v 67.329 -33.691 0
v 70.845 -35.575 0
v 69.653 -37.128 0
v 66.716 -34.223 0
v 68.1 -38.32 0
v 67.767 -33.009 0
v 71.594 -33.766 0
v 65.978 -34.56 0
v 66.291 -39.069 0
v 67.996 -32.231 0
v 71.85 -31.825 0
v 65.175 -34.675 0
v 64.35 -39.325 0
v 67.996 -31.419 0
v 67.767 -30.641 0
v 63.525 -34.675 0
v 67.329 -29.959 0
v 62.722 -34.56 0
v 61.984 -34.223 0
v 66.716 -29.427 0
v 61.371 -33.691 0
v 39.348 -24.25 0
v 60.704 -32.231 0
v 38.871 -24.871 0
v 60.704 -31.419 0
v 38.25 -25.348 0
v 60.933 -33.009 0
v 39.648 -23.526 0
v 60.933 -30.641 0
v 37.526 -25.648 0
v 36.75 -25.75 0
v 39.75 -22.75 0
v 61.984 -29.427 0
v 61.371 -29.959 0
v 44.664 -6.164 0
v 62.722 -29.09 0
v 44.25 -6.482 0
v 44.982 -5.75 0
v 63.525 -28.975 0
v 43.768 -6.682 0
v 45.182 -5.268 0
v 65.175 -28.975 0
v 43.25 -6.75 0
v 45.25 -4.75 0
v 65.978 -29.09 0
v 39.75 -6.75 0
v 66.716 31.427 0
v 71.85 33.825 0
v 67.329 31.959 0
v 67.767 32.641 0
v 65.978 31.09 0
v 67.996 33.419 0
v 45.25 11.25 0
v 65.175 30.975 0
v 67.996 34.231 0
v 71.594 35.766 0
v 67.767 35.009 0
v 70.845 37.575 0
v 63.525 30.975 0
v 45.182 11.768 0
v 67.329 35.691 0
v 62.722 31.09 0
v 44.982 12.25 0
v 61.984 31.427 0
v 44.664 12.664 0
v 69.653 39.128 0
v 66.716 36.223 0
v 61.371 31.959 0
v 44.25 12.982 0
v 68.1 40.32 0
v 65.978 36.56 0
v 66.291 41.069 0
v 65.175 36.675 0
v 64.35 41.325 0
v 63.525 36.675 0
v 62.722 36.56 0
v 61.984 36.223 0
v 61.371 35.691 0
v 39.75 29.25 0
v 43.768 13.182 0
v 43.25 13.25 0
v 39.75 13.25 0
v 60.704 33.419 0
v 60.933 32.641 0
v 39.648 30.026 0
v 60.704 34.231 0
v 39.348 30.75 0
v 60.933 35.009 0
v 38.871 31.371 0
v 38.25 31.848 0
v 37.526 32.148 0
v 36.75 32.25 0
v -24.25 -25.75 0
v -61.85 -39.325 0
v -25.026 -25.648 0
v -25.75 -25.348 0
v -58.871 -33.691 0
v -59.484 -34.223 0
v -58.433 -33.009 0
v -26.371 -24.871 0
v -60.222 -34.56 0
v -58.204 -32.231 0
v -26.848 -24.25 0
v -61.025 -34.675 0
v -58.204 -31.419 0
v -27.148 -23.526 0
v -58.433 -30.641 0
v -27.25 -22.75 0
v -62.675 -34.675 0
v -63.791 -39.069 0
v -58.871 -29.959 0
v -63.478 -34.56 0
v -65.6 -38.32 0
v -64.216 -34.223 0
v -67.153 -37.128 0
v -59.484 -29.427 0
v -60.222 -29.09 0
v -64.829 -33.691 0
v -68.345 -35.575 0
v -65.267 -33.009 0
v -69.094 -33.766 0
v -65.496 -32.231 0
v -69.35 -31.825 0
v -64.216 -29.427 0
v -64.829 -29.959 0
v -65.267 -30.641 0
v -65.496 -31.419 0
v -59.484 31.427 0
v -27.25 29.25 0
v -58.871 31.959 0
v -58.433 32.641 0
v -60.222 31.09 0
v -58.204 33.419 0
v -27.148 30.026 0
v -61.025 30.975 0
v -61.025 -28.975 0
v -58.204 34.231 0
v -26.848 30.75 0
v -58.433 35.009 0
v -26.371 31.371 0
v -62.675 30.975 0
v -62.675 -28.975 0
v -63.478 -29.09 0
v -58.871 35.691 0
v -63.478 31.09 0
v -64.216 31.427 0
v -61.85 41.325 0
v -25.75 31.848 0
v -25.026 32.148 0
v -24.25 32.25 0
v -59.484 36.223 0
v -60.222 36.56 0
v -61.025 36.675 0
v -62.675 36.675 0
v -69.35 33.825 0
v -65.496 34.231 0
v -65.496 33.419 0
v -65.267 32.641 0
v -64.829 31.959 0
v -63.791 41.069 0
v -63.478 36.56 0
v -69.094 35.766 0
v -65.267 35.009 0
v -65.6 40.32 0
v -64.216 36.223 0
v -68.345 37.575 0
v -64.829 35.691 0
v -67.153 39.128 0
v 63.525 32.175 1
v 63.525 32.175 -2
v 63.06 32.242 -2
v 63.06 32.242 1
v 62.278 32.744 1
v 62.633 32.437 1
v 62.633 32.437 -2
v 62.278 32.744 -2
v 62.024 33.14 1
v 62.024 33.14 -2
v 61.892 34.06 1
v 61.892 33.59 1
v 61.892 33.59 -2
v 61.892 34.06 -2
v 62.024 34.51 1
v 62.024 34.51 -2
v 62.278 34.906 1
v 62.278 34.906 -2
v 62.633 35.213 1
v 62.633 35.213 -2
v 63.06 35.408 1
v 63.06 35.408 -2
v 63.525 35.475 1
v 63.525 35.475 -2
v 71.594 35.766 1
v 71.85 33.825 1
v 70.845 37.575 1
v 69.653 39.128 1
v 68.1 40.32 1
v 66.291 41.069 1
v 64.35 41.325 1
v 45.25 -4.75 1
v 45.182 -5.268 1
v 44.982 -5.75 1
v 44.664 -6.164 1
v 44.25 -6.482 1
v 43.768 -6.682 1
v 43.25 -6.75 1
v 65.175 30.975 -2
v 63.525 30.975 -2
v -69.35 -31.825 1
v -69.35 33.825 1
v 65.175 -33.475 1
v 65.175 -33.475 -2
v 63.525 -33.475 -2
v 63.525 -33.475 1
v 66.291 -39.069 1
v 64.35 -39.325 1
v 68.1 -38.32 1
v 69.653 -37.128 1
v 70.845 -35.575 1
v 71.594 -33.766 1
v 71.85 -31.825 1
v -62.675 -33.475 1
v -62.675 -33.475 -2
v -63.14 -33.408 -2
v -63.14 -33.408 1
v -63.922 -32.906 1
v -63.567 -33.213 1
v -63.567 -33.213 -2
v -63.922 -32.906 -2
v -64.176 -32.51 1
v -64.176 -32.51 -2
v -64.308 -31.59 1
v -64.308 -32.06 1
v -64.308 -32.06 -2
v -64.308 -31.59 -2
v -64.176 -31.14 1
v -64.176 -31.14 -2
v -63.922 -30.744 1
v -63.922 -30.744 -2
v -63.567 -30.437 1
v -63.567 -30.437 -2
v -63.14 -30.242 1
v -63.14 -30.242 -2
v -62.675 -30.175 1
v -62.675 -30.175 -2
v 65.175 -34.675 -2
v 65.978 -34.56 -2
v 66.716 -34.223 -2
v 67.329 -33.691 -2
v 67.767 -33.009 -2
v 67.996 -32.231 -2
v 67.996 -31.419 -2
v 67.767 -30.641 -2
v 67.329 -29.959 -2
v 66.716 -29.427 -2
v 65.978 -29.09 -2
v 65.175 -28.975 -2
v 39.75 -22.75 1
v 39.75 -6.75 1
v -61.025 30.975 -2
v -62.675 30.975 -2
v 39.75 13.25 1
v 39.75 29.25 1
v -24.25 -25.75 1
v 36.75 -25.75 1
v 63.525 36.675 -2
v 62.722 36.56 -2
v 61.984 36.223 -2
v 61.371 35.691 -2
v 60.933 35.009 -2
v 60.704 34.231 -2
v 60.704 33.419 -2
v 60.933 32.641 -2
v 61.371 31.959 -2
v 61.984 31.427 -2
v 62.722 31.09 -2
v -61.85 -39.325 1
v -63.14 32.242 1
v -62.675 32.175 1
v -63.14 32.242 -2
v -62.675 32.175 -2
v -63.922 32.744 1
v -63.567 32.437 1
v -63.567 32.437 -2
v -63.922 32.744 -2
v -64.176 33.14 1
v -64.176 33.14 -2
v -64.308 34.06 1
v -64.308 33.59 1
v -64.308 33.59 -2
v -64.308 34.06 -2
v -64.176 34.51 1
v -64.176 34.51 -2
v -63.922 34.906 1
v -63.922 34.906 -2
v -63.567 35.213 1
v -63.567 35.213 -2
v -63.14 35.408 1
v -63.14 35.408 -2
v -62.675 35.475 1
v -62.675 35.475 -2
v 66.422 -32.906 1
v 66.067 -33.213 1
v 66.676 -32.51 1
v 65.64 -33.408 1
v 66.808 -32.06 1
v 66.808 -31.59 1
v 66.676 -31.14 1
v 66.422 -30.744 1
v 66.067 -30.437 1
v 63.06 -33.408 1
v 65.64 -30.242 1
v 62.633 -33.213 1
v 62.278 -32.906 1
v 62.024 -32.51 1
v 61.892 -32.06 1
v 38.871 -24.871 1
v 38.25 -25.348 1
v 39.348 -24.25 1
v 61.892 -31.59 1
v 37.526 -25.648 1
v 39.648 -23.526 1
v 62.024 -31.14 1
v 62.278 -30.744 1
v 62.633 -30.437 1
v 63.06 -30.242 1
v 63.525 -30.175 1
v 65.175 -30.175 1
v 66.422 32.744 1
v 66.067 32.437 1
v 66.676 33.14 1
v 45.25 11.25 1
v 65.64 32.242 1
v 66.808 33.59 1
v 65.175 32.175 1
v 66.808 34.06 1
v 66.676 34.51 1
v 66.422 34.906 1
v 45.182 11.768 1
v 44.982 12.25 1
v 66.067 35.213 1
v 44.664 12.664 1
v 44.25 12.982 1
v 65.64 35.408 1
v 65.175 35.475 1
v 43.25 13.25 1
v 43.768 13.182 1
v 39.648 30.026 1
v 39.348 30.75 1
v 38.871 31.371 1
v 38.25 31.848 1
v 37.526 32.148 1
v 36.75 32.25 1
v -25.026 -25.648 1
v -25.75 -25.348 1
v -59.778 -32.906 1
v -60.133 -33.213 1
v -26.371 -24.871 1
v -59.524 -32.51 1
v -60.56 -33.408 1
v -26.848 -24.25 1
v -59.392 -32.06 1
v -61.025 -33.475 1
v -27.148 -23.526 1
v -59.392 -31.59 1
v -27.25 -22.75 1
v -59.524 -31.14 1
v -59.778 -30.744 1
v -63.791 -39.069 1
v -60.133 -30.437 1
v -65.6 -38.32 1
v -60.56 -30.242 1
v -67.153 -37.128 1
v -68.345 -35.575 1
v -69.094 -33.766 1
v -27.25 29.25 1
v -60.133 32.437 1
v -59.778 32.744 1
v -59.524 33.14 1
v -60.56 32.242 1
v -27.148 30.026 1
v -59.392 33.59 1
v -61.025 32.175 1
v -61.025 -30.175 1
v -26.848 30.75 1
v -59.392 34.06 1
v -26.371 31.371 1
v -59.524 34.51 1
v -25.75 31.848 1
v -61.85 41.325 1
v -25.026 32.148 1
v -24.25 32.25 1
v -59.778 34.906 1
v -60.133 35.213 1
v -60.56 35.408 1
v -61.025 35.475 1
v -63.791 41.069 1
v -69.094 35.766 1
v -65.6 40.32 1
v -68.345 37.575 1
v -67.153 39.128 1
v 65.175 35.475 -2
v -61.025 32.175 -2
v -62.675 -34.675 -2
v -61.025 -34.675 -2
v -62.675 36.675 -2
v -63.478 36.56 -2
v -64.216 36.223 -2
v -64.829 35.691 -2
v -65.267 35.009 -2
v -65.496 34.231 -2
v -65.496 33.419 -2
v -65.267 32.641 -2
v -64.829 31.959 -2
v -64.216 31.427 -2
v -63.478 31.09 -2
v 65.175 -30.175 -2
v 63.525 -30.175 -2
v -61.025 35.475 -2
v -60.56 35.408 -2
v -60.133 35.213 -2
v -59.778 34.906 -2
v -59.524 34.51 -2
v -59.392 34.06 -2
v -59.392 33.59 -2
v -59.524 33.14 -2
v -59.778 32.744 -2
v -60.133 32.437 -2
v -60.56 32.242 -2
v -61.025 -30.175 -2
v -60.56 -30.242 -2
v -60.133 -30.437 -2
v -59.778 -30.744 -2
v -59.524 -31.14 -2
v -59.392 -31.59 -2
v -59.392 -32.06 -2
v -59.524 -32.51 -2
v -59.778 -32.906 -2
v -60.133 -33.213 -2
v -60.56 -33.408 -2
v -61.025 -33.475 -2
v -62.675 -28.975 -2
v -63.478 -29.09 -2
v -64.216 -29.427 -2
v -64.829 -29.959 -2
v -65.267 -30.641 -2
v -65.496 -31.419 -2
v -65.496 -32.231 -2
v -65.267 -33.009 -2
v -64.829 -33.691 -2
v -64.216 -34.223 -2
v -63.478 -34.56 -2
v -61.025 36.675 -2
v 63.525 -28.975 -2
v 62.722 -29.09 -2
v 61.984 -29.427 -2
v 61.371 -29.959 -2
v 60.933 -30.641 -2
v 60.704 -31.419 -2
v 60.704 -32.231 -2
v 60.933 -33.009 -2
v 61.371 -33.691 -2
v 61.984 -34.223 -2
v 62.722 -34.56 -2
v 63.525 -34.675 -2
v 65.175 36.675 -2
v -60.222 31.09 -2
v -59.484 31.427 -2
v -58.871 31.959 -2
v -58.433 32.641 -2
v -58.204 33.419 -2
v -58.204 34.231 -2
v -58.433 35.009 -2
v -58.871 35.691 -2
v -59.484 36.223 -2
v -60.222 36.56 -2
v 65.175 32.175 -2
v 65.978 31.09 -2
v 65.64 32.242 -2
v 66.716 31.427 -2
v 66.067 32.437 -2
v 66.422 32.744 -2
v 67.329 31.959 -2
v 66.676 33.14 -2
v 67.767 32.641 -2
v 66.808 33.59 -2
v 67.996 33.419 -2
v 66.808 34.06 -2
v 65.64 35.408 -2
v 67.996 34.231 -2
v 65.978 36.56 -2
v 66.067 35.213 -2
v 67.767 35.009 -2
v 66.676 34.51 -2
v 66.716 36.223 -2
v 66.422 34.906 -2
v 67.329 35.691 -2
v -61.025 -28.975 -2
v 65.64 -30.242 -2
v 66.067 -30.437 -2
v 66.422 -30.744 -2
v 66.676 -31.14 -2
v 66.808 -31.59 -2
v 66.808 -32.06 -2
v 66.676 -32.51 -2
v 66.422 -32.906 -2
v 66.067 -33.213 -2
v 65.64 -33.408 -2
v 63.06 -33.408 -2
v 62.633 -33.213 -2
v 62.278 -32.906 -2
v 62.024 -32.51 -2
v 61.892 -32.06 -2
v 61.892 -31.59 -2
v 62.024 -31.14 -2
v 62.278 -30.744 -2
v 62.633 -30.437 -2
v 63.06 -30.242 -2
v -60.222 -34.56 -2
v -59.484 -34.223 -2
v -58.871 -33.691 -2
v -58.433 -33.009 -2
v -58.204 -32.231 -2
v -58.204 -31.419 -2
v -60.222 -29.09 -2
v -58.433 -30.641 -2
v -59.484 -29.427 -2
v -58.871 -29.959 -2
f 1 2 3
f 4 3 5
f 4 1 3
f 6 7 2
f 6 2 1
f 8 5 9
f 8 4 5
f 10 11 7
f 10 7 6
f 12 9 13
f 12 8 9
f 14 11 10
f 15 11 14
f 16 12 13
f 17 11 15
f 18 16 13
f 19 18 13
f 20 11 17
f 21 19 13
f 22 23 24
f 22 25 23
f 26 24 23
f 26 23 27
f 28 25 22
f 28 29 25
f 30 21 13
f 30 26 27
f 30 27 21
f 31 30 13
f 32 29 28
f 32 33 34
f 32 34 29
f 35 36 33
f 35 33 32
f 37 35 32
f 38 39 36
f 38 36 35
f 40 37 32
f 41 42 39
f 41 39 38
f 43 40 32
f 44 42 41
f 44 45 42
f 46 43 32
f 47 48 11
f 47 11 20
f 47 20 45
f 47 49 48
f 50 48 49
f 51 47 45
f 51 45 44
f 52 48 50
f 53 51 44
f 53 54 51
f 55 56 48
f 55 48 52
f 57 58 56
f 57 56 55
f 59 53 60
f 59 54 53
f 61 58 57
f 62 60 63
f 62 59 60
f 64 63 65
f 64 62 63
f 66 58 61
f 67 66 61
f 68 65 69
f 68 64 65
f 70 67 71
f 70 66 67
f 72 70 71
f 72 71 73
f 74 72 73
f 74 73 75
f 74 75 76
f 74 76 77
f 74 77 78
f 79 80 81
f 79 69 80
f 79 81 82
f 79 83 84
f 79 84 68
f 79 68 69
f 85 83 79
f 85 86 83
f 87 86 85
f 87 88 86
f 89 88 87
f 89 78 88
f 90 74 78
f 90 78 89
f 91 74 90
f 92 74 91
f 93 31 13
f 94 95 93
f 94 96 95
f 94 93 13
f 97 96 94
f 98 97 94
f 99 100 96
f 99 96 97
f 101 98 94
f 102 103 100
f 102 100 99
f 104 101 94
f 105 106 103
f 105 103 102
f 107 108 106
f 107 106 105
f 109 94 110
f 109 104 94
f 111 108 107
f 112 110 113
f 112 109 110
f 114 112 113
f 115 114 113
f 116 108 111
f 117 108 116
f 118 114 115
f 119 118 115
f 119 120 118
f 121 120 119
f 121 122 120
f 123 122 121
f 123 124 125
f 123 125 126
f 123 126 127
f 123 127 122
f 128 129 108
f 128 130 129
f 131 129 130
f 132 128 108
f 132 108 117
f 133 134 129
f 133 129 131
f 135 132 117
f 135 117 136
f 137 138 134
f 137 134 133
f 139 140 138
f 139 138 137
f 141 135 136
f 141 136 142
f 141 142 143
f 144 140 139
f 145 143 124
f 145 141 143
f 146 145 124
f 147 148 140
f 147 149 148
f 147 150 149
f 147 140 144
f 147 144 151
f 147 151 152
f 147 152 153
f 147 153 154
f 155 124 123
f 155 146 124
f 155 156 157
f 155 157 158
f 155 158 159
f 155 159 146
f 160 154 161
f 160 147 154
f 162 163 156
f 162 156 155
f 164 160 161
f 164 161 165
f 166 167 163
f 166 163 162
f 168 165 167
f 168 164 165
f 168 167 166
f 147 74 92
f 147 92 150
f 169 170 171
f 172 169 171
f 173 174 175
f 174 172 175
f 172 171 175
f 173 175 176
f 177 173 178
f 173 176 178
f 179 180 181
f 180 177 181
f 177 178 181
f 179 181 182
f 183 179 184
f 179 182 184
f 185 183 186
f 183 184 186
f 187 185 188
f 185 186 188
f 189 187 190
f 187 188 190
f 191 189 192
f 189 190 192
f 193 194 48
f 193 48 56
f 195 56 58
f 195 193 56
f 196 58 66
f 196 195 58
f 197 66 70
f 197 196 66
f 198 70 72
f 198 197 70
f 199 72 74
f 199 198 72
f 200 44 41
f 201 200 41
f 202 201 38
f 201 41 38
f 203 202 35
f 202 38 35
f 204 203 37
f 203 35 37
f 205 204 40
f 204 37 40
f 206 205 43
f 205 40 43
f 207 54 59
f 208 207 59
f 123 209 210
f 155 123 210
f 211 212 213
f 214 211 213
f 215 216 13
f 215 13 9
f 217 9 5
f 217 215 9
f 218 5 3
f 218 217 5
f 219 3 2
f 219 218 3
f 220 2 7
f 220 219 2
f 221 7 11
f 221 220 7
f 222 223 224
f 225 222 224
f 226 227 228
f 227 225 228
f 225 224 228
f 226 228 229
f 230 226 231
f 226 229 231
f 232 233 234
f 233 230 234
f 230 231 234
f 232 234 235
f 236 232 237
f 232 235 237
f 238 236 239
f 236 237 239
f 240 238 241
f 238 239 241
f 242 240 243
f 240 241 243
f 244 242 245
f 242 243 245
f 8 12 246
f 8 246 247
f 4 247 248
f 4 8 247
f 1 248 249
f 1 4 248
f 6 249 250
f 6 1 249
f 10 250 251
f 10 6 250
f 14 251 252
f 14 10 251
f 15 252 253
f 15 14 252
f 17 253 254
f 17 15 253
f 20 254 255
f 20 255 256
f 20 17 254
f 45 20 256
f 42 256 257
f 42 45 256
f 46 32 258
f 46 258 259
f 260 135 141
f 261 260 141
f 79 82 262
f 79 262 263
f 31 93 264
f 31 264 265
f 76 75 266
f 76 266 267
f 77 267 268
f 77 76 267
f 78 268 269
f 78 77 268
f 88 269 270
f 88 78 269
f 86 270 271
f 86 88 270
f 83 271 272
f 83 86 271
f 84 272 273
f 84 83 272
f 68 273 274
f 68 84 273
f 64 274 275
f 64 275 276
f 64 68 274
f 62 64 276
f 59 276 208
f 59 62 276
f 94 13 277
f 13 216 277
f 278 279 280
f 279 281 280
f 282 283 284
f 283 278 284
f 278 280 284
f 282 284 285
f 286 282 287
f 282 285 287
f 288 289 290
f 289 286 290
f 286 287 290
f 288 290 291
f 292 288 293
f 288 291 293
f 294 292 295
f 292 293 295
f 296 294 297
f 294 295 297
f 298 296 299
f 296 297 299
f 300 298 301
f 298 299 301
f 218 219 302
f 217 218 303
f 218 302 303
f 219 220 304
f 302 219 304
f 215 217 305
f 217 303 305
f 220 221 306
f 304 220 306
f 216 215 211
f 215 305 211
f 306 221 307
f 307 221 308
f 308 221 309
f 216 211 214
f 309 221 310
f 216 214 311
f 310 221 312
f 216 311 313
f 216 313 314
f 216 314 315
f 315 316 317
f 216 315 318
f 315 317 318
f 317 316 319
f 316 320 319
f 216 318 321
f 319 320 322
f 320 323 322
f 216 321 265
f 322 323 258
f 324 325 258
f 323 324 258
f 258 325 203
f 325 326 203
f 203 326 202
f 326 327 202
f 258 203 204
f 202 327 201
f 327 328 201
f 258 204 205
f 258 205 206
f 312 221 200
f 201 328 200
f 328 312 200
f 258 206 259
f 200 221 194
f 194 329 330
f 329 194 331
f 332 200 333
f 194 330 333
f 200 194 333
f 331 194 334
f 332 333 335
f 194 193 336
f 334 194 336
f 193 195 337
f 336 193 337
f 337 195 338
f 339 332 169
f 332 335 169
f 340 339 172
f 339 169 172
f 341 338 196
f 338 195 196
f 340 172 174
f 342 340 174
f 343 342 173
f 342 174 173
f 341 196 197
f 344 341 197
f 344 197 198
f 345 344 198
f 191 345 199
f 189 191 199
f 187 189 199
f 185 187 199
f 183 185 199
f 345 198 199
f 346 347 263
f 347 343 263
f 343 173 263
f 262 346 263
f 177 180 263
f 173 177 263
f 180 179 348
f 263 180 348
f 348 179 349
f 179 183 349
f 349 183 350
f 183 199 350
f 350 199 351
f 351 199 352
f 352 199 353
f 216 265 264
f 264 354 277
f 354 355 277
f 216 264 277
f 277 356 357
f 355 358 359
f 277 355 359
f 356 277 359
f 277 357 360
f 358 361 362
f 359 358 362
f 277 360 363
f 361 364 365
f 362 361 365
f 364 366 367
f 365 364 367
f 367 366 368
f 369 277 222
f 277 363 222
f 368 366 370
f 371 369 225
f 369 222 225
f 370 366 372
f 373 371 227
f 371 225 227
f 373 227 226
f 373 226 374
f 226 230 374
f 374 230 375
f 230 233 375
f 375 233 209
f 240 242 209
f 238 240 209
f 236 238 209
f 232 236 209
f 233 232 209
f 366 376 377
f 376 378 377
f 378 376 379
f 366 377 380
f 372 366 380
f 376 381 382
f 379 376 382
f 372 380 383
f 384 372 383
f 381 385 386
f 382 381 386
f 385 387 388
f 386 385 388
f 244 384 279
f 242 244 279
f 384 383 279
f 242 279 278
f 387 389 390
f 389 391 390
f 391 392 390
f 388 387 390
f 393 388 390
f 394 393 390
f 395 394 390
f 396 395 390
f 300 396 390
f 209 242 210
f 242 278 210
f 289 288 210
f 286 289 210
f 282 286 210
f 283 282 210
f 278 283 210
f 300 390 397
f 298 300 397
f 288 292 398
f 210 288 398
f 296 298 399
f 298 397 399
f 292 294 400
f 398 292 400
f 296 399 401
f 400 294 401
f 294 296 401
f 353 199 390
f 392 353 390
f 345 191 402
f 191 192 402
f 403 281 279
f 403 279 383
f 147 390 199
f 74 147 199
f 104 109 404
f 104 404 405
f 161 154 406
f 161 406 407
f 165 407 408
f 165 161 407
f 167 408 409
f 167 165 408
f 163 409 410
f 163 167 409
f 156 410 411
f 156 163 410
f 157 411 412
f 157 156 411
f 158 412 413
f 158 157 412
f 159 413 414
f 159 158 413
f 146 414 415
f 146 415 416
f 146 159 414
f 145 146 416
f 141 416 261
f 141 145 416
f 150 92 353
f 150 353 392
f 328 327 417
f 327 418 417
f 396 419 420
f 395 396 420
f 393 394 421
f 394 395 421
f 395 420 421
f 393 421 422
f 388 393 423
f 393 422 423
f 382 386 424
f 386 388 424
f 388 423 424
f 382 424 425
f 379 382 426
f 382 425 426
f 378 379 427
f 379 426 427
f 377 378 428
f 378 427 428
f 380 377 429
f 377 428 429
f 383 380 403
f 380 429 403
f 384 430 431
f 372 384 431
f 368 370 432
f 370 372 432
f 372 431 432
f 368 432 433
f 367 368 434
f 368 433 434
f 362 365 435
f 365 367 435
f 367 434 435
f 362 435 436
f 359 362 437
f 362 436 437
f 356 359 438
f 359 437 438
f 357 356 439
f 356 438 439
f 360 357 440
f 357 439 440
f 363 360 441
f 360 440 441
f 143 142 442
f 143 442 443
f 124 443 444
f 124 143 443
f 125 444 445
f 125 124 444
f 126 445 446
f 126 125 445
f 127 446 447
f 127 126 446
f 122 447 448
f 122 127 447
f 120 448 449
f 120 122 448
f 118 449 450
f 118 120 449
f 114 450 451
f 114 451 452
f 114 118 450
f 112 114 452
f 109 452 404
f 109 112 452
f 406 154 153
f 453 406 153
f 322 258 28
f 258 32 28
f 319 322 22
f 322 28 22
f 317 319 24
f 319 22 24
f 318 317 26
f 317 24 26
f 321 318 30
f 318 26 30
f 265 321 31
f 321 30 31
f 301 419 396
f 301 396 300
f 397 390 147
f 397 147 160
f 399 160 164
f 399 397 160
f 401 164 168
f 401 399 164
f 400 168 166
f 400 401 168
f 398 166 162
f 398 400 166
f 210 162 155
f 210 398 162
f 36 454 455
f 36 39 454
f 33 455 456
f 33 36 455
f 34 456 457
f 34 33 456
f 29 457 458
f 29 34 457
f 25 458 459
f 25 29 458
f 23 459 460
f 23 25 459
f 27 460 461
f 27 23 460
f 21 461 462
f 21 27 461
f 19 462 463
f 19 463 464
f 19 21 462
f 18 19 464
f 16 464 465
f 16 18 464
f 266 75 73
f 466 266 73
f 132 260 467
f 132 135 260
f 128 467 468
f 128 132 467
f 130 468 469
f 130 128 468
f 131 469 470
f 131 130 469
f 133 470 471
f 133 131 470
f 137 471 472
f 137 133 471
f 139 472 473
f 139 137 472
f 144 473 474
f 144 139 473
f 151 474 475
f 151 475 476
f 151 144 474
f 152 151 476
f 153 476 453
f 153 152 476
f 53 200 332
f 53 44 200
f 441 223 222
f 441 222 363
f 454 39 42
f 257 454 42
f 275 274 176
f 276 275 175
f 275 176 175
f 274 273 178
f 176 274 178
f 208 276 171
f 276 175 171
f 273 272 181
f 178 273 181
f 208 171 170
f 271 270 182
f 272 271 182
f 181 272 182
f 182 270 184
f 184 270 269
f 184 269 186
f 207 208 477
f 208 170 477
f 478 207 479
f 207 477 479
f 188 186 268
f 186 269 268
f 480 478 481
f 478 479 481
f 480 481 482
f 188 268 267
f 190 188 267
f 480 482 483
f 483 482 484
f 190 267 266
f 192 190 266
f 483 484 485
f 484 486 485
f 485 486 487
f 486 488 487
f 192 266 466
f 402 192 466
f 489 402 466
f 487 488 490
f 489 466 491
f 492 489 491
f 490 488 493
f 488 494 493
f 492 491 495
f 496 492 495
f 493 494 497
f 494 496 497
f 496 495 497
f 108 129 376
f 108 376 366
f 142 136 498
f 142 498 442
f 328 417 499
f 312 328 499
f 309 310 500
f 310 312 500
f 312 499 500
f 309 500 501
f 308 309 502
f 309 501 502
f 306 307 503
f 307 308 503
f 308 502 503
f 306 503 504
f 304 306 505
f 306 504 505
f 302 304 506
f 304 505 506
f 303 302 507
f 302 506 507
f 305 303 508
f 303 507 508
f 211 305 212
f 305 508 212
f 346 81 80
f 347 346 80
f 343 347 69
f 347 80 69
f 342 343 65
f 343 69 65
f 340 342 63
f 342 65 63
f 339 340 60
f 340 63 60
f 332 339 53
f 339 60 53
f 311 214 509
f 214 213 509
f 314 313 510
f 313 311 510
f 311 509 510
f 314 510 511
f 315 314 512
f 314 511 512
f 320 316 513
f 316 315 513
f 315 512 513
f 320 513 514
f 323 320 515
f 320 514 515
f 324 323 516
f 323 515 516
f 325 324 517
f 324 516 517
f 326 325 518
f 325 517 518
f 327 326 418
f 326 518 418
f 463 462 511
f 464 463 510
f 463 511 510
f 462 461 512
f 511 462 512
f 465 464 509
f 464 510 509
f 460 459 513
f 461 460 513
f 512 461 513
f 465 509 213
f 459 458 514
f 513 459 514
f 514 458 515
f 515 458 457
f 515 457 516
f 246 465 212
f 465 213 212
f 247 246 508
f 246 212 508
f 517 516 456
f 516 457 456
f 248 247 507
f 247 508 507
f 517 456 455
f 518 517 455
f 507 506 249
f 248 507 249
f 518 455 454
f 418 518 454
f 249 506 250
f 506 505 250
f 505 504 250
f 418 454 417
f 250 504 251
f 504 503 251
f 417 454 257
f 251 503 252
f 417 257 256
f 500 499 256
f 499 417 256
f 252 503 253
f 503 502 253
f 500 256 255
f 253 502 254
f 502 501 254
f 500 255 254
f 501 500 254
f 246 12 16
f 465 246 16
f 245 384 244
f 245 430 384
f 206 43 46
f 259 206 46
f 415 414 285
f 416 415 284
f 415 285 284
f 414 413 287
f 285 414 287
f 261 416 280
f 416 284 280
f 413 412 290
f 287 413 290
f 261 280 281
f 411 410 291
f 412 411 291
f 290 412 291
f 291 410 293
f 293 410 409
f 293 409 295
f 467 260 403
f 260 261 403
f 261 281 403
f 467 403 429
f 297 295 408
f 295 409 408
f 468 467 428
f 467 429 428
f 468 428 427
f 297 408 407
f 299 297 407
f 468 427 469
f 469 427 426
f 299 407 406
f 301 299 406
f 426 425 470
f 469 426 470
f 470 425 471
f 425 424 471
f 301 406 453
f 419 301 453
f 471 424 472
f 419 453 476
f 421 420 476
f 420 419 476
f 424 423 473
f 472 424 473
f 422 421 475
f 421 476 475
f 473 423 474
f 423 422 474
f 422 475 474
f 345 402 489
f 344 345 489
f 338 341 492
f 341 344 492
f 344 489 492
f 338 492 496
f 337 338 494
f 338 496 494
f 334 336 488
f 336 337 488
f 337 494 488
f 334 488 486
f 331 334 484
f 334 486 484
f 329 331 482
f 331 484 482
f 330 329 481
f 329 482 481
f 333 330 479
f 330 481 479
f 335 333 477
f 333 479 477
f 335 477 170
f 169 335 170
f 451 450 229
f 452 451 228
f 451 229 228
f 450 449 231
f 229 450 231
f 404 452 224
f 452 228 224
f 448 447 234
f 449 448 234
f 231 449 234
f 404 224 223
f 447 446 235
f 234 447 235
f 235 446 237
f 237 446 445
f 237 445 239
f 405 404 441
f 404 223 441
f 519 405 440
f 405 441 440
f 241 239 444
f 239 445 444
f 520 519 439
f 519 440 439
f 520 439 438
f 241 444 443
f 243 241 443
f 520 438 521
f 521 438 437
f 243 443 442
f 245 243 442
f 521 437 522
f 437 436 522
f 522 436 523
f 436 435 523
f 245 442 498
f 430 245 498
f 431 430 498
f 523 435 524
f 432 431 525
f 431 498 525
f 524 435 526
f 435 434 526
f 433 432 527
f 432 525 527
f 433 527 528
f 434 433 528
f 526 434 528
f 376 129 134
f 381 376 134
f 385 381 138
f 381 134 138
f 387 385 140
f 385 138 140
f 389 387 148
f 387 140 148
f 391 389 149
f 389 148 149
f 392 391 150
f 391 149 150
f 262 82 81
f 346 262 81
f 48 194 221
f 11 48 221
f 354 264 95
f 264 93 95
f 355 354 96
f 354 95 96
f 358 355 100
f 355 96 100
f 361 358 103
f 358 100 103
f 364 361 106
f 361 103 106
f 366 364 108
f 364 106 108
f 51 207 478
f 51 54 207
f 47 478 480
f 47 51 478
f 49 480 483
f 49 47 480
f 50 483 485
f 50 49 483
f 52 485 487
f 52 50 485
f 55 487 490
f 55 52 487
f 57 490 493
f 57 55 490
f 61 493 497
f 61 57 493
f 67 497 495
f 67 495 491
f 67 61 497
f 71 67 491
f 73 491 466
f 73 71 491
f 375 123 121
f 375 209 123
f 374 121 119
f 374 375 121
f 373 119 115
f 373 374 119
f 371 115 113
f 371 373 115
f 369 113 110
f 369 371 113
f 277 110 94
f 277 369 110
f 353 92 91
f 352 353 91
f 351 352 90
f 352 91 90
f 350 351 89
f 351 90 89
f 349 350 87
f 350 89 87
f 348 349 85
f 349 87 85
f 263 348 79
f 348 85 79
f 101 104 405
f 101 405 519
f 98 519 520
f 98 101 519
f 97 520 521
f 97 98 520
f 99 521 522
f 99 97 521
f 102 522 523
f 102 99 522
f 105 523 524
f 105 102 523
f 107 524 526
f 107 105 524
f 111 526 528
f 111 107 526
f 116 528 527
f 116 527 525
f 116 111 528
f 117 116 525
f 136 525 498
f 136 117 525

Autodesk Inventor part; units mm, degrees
ref_plane "YZ Plane" through (0, 0, 0) normal (1, 0, 0) x (0, 1, 0)
ref_plane "XZ Plane" through (0, 0, 0) normal (0, 1, 0) x (-1, 0, 0)
ref_plane "XY Plane" through (0, 0, 0) normal (0, 0, 1) x (1, 0, 0)
sketch "Sketch1" plane through (0, 0, 0) normal (0, 0, 1) x (1, 0, 0)
  line L0 (-88.6, 55.18) -> (88.6, 55.18)
  line L1 (96.28, 47.5) -> (96.28, -47.5)
  line L2 (88.6, -55.18) -> (-88.6, -55.18)
  line L3 (-96.28, -47.5) -> (-96.28, 47.5)
  arc A0 (-96.28, -47.5) -> (-88.6, -55.18) centre (-88.6, -47.5) ccw
  arc A1 (88.6, -55.18) -> (96.28, -47.5) centre (88.6, -47.5) ccw
  arc A2 (96.28, 47.5) -> (88.6, 55.18) centre (88.6, 47.5) ccw
  arc A3 (-88.6, 55.18) -> (-96.28, 47.5) centre (-88.6, 47.5) ccw
  line L4 (85, 52.5) -> (-85, 52.5)
  line L5 (-85, 52.5) -> (-85, -52.5)
  line L6 (-85, -52.5) -> (85, -52.5)
  line L7 (85, -52.5) -> (85, 52.5)
  line L8 (85, 52.5) -> (-85, -52.5) construction
  line L9 (-85, 52.5) -> (85, -52.5) construction
  line L10 (0, -55.18) -> (0, 55.18) construction
  line L11 (-96.28, 0) -> (96.28, 0) construction
  line L12 (88.6, -47.5) -> (-88.6, -47.5) construction
  line L13 (-88.6, -47.5) -> (-88.6, 47.5) construction
  line L14 (-88.6, 47.5) -> (88.6, 47.5) construction
  line L15 (88.6, 47.5) -> (88.6, -47.5) construction
  line L16 (-92.28, -50) -> (-92.28, 50)
  line L17 (-92.28, -50) -> (-85, -50)
  line L18 (-92.28, 50) -> (-85, 50)
  line L19 (64.35, -31.825) -> (64.35, 33.825) construction
  line L20 (64.35, 33.825) -> (-61.85, 33.825) construction
  line L21 (-61.85, 33.825) -> (-61.85, -31.825) construction
  line L22 (-61.85, -31.825) -> (64.35, -31.825) construction
  line L23 (-61.85, 33.825) -> (64.35, -31.825) construction
  line L24 (-61.85, -31.825) -> (64.35, 33.825) construction
  line L25 (1.25, 0) -> (1.25, 1) construction
  line L26 (1.25, 1) -> (0, 1) construction
  line L27 (63.525, -31.825) -> (65.175, -31.825) construction
  line L28 (63.525, -30.175) -> (65.175, -30.175)
  line L29 (65.175, -33.475) -> (63.525, -33.475)
  arc A4 (63.525, -30.175) -> (63.525, -33.475) centre (63.525, -31.825) ccw
  arc A5 (65.175, -33.475) -> (65.175, -30.175) centre (65.175, -31.825) ccw
  line L30 (63.525, 33.825) -> (65.175, 33.825) construction
  line L31 (63.525, 35.475) -> (65.175, 35.475)
  line L32 (65.175, 32.175) -> (63.525, 32.175)
  arc A6 (63.525, 35.475) -> (63.525, 32.175) centre (63.525, 33.825) ccw
  arc A7 (65.175, 32.175) -> (65.175, 35.475) centre (65.175, 33.825) ccw
  line L33 (-61.025, 33.825) -> (-62.675, 33.825) construction
  line L34 (-61.025, 35.475) -> (-62.675, 35.475)
  line L35 (-62.675, 32.175) -> (-61.025, 32.175)
  arc A8 (-61.025, 32.175) -> (-61.025, 35.475) centre (-61.025, 33.825) ccw
  arc A9 (-62.675, 35.475) -> (-62.675, 32.175) centre (-62.675, 33.825) ccw
  line L36 (-61.025, -31.825) -> (-62.675, -31.825) construction
  line L37 (-61.025, -30.175) -> (-62.675, -30.175)
  line L38 (-62.675, -33.475) -> (-61.025, -33.475)
  arc A10 (-61.025, -33.475) -> (-61.025, -30.175) centre (-61.025, -31.825) ccw
  arc A11 (-62.675, -30.175) -> (-62.675, -33.475) centre (-62.675, -31.825) ccw
  line L39 (98.28, -57.18) -> (-98.28, -57.18)
  line L40 (-98.28, -57.18) -> (-98.28, 57.18)
  line L41 (-98.28, 57.18) -> (98.28, 57.18)
  line L42 (98.28, 57.18) -> (98.28, -57.18)
  line L43 (98.28, -57.18) -> (-98.28, 57.18) construction
  line L44 (-98.28, -57.18) -> (98.28, 57.18) construction
  line L45 (-69.85, 27.075) -> (-53.85, 27.075)
  line L46 (-53.85, 27.075) -> (-53.85, 40.575)
  line L47 (-53.85, 40.575) -> (-69.85, 40.575)
  line L48 (-69.85, 40.575) -> (-69.85, 27.075)
  line L49 (-69.85, 27.075) -> (-53.85, 40.575) construction
  line L50 (-53.85, 27.075) -> (-69.85, 40.575) construction
  line L51 (-53.85, -38.575) -> (-69.85, -38.575)
  line L52 (-69.85, -38.575) -> (-69.85, -25.075)
  line L53 (-69.85, -25.075) -> (-53.85, -25.075)
  line L54 (-53.85, -25.075) -> (-53.85, -38.575)
  line L55 (-53.85, -38.575) -> (-69.85, -25.075) construction
  line L56 (-69.85, -38.575) -> (-53.85, -25.075) construction
  line L57 (56.35, -38.575) -> (72.35, -38.575)
  line L58 (72.35, -38.575) -> (72.35, -25.075)
  line L59 (72.35, -25.075) -> (56.35, -25.075)
  line L60 (56.35, -25.075) -> (56.35, -38.575)
  line L61 (56.35, -38.575) -> (72.35, -25.075) construction
  line L62 (72.35, -38.575) -> (56.35, -25.075) construction
  line L63 (72.35, 40.575) -> (56.35, 40.575)
  line L64 (56.35, 40.575) -> (56.35, 27.075)
  line L65 (56.35, 27.075) -> (72.35, 27.075)
  line L66 (72.35, 27.075) -> (72.35, 40.575)
  line L67 (72.35, 40.575) -> (56.35, 27.075) construction
  line L68 (56.35, 40.575) -> (72.35, 27.075) construction
  line L69 (-22.75, -21.25) -> (35.25, -21.25) construction
  line L70 (35.25, -21.25) -> (35.25, 27.75) construction
  line L71 (35.25, 27.75) -> (-22.75, 27.75) construction
  line L72 (-22.75, 27.75) -> (-22.75, -21.25) construction
  line L73 (-22.75, -21.25) -> (35.25, 27.75) construction
  line L74 (35.25, -21.25) -> (-22.75, 27.75) construction
  line L75 (-22.75, -31.25) -> (35.25, -31.25)
  line L76 (45.25, -21.25) -> (45.25, 27.75)
  line L77 (35.25, 37.75) -> (-22.75, 37.75)
  line L78 (-32.75, 27.75) -> (-32.75, -21.25)
  line L79 (-32.75, -31.25) -> (45.25, 37.75) construction
  line L80 (45.25, -31.25) -> (-32.75, 37.75) construction
  arc A12 (-22.75, 37.75) -> (-32.75, 27.75) centre (-22.75, 27.75) ccw
  arc A13 (-32.75, -21.25) -> (-22.75, -31.25) centre (-22.75, -21.25) ccw
  arc A14 (35.25, -31.25) -> (45.25, -21.25) centre (35.25, -21.25) ccw
  arc A15 (45.25, 27.75) -> (35.25, 37.75) centre (35.25, 27.75) ccw
  line L81 (59.25, 16.75) -> (59.25, -10.25)
  line L82 (59.25, -10.25) -> (45.25, -10.25)
  line L83 (45.25, 16.75) -> (59.25, 16.75)
  line L84 (59.25, 3.25) -> (6.25, 3.25) construction
  line L85 (-17.5, -52.7) -> (-17.5, -31.25)
  line L86 (-17.5, -52.7) -> (17.5, -52.7)
  line L87 (17.5, -52.7) -> (17.5, -31.25)
  line L88 (0, 0) -> (0, -52.7) construction
  point P0 (0, 0)
  point P1 (0, 0)
  point P2 (0, -60)
  point P3 (-64.35, 17.825)
  point P4 (-64.35, 14.525)
  point P5 (61.85, 17.825)
  point P6 (61.85, 14.525)
  point P7 (61.85, 83.475)
  point P8 (61.85, 80.175)
  point P9 (-64.35, 80.175)
  point P10 (-64.35, 83.475)
  point P11 (0, -52.5)
  point P12 (0, 0)
  point P13 (0, 0)
  point P14 (-92.28, 0)
  point P15 (0, 0)
  point P16 (1.25, 1)
  point P17 (204.35, 170.6447)
  point P18 (204.35, 167.7053)
  point P19 (0, 0)
  dimension "d0" = 7.68
  dimension "d1" = 170
  dimension "d2" = 105
  dimension "d3" = 177.2
  dimension "d4" = 95
  dimension "d5" = 100
  dimension "d6" = 4
  dimension "d7" = 65.65
  dimension "d8" = 126.2
  dimension "d9" = 1.25
  dimension "d10" = 1
  dimension "d11" = 1.65
  dimension "d12" = 3.3
  dimension "d13" = 60
  dimension "d14" = 2
  dimension "d15" = 2
  dimension "d16" = 13.5
  dimension "d17" = 16
  dimension "d18" = 58
  dimension "d19" = 49
  dimension "d20" = 3.25
  dimension "d21" = 10
  dimension "d22" = 53
  dimension "d23" = 27
  dimension "d24" = 6.25
  dimension "d25" = 0.2
  dimension "d26" = 35
extrude "Extrusion1" add sketch "Sketch1" along normal blind 1 contours L7 L6 L87 L75 A14 L76 L82 L81 L83 A15 L77 A12 L78 A13 L85 L5 L4 | L6 L85 L75 L87 | L76 L83 L81 L82 | L48 L47 L46 L45 | L51 L52 L53 L54 | L60 L59 L58 L57 | L66 L65 L64 L63
sketch "Sketch2" plane through (0, 0, 1) normal (0, 0, 1) x (1, 0, 0)
  arc A0 (65.175, 32.175) -> (65.175, 35.475) centre (65.175, 33.825) ccw projected
  line L0 (65.175, 35.475) -> (63.525, 35.475) projected
  arc A1 (63.525, 35.475) -> (63.525, 32.175) centre (63.525, 33.825) ccw projected
  line L1 (63.525, 32.175) -> (65.175, 32.175) projected
  arc A2 (35.25, -31.25) -> (45.25, -21.25) centre (35.25, -21.25) ccw projected
  line L2 (45.25, -21.25) -> (45.25, 27.75) projected
  arc A3 (45.25, 27.75) -> (35.25, 37.75) centre (35.25, 27.75) ccw projected
  line L3 (35.25, 37.75) -> (-22.75, 37.75) projected
  arc A4 (-22.75, 37.75) -> (-32.75, 27.75) centre (-22.75, 27.75) ccw projected
  line L4 (-32.75, 27.75) -> (-32.75, -21.25) projected
  arc A5 (-32.75, -21.25) -> (-22.75, -31.25) centre (-22.75, -21.25) ccw projected
  line L5 (-22.75, -31.25) -> (35.25, -31.25) projected
  arc A6 (65.175, -33.475) -> (65.175, -30.175) centre (65.175, -31.825) ccw projected
  line L6 (65.175, -30.175) -> (63.525, -30.175) projected
  arc A7 (63.525, -30.175) -> (63.525, -33.475) centre (63.525, -31.825) ccw projected
  line L7 (63.525, -33.475) -> (65.175, -33.475) projected
  line L8 (-61.025, -30.175) -> (-62.675, -30.175) projected
  arc A8 (-62.675, -30.175) -> (-62.675, -33.475) centre (-62.675, -31.825) ccw projected
  line L9 (-62.675, -33.475) -> (-61.025, -33.475) projected
  arc A9 (-61.025, -33.475) -> (-61.025, -30.175) centre (-61.025, -31.825) ccw projected
  line L10 (-61.025, 35.475) -> (-62.675, 35.475) projected
  arc A10 (-62.675, 35.475) -> (-62.675, 32.175) centre (-62.675, 33.825) ccw projected
  line L11 (-62.675, 32.175) -> (-61.025, 32.175) projected
  arc A11 (-61.025, 32.175) -> (-61.025, 35.475) centre (-61.025, 33.825) ccw projected
  line L12 (85, -52.5) -> (-85, -52.5) projected
  line L13 (-85, -52.5) -> (-85, 52.5) projected
  line L14 (-85, 52.5) -> (85, 52.5) projected
  line L15 (85, 52.5) -> (85, -52.5) projected
  line L16 (63.525, 33.825) -> (65.175, 33.825) construction
  line L17 (-62.675, -31.825) -> (-61.025, -31.825) construction
  line L18 (64.35, -39.325) -> (-61.85, -39.325)
  line L19 (-69.35, -31.825) -> (-69.35, 33.825)
  line L20 (-61.85, 41.325) -> (64.35, 41.325)
  line L21 (71.85, 33.825) -> (71.85, -31.825)
  line L22 (71.85, -39.325) -> (-69.35, 41.325) construction
  line L23 (-69.35, -39.325) -> (71.85, 41.325) construction
  arc A12 (71.85, 33.825) -> (64.35, 41.325) centre (64.35, 33.825) ccw
  arc A13 (-61.85, 41.325) -> (-69.35, 33.825) centre (-61.85, 33.825) ccw
  arc A14 (-69.35, -31.825) -> (-61.85, -39.325) centre (-61.85, -31.825) ccw
  arc A15 (64.35, -39.325) -> (71.85, -31.825) centre (64.35, -31.825) ccw
  point P0 (0, 0)
  point P1 (1.25, 1)
  point P2 (-61.85, -31.825)
  dimension "d29" = 7.5
extrude "Extrusion2" cut sketch "Sketch2" against normal through all contours L18 A14 L19 A13 L20 A12 L21 A15 keep common part
sketch "Sketch3" plane through (0, 0, 1) normal (0, 0, 1) x (1, 0, 0)
  arc A0 (64.35, -39.325) -> (71.85, -31.825) centre (64.35, -31.825) ccw projected
  line L0 (64.35, -39.325) -> (-61.85, -39.325) projected
  arc A1 (-69.35, -31.825) -> (-61.85, -39.325) centre (-61.85, -31.825) ccw projected
  line L1 (-69.35, -31.825) -> (-69.35, 33.825) projected
  arc A2 (-61.85, 41.325) -> (-69.35, 33.825) centre (-61.85, 33.825) ccw projected
  line L2 (-61.85, 41.325) -> (64.35, 41.325) projected
  arc A3 (71.85, 33.825) -> (64.35, 41.325) centre (64.35, 33.825) ccw projected
  line L3 (71.85, 33.825) -> (71.85, -31.825) projected
  arc A4 (65.175, 32.175) -> (65.175, 35.475) centre (65.175, 33.825) ccw projected
  line L4 (65.175, 35.475) -> (63.525, 35.475) projected
  arc A5 (63.525, 35.475) -> (63.525, 32.175) centre (63.525, 33.825) ccw projected
  line L5 (63.525, 32.175) -> (65.175, 32.175) projected
  arc A6 (35.25, -31.25) -> (45.25, -21.25) centre (35.25, -21.25) ccw projected
  line L6 (45.25, -21.25) -> (45.25, 27.75) projected
  arc A7 (45.25, 27.75) -> (35.25, 37.75) centre (35.25, 27.75) ccw projected
  line L7 (35.25, 37.75) -> (-22.75, 37.75) projected
  arc A8 (-22.75, 37.75) -> (-32.75, 27.75) centre (-22.75, 27.75) ccw projected
  line L8 (-32.75, 27.75) -> (-32.75, -21.25) projected
  arc A9 (-32.75, -21.25) -> (-22.75, -31.25) centre (-22.75, -21.25) ccw projected
  line L9 (-22.75, -31.25) -> (35.25, -31.25) projected
  arc A10 (65.175, -33.475) -> (65.175, -30.175) centre (65.175, -31.825) ccw projected
  line L10 (65.175, -30.175) -> (63.525, -30.175) projected
  arc A11 (63.525, -30.175) -> (63.525, -33.475) centre (63.525, -31.825) ccw projected
  line L11 (63.525, -33.475) -> (65.175, -33.475) projected
  line L12 (-61.025, -30.175) -> (-62.675, -30.175) projected
  arc A12 (-62.675, -30.175) -> (-62.675, -33.475) centre (-62.675, -31.825) ccw projected
  line L13 (-62.675, -33.475) -> (-61.025, -33.475) projected
  arc A13 (-61.025, -33.475) -> (-61.025, -30.175) centre (-61.025, -31.825) ccw projected
  line L14 (-61.025, 35.475) -> (-62.675, 35.475) projected
  arc A14 (-62.675, 35.475) -> (-62.675, 32.175) centre (-62.675, 33.825) ccw projected
  line L15 (-62.675, 32.175) -> (-61.025, 32.175) projected
  arc A15 (-61.025, 32.175) -> (-61.025, 35.475) centre (-61.025, 33.825) ccw projected
  line L16 (-61.025, 30.975) -> (-62.675, 30.975)
  arc A16 (-62.675, 36.675) -> (-62.675, 30.975) centre (-62.675, 33.825) ccw
  line L17 (-62.675, 36.675) -> (-61.025, 36.675)
  arc A17 (-61.025, 30.975) -> (-61.025, 36.675) centre (-61.025, 33.825) ccw
  arc A18 (65.175, 30.975) -> (65.175, 36.675) centre (65.175, 33.825) ccw
  line L18 (65.175, 30.975) -> (63.525, 30.975)
  arc A19 (63.525, 36.675) -> (63.525, 30.975) centre (63.525, 33.825) ccw
  line L19 (63.525, 36.675) -> (65.175, 36.675)
  arc A20 (65.175, -34.675) -> (65.175, -28.975) centre (65.175, -31.825) ccw
  line L20 (65.175, -34.675) -> (63.525, -34.675)
  arc A21 (63.525, -28.975) -> (63.525, -34.675) centre (63.525, -31.825) ccw
  line L21 (63.525, -28.975) -> (65.175, -28.975)
  line L22 (-61.025, -28.975) -> (-62.675, -28.975)
  arc A22 (-62.675, -28.975) -> (-62.675, -34.675) centre (-62.675, -31.825) ccw
  line L23 (-62.675, -34.675) -> (-61.025, -34.675)
  arc A23 (-61.025, -34.675) -> (-61.025, -28.975) centre (-61.025, -31.825) ccw
  point P0 (0, 0)
  dimension "d32" = 5.7
extrude "Extrusion3" add sketch "Sketch3" against normal blind 3 contours L16 A16 L17 A17 | L18 A19 L19 A18 | L20 A21 L21 A20 | A23 L23 A22 L22
sketch "Sketch4" plane through (0, 0, 0) normal (0, 0, -1) x (-1, 0, 0)
  line L0 (-65.175, -28.975) -> (-63.525, -28.975) projected
  arc A0 (-63.525, -34.675) -> (-63.525, -28.975) centre (-63.525, -31.825) ccw projected
  line L1 (-63.525, -34.675) -> (-65.175, -34.675) projected
  arc A1 (-65.175, -28.975) -> (-65.175, -34.675) centre (-65.175, -31.825) ccw projected
  line L2 (-65.175, 36.675) -> (-63.525, 36.675) projected
  arc A2 (-63.525, 30.975) -> (-63.525, 36.675) centre (-63.525, 33.825) ccw projected
  line L3 (-63.525, 30.975) -> (-65.175, 30.975) projected
  arc A3 (-65.175, 36.675) -> (-65.175, 30.975) centre (-65.175, 33.825) ccw projected
  arc A4 (61.025, -28.975) -> (61.025, -34.675) centre (61.025, -31.825) ccw projected
  line L4 (61.025, -28.975) -> (62.675, -28.975) projected
  arc A5 (62.675, -34.675) -> (62.675, -28.975) centre (62.675, -31.825) ccw projected
  line L5 (62.675, -34.675) -> (61.025, -34.675) projected
  line L6 (61.025, 36.675) -> (62.675, 36.675) projected
  arc A6 (62.675, 30.975) -> (62.675, 36.675) centre (62.675, 33.825) ccw projected
  line L7 (62.675, 30.975) -> (61.025, 30.975) projected
  arc A7 (61.025, 36.675) -> (61.025, 30.975) centre (61.025, 33.825) ccw projected
  arc A8 (-71.85, -31.825) -> (-64.35, -39.325) centre (-64.35, -31.825) ccw projected
  line L8 (-71.85, -31.825) -> (-71.85, 33.825) projected
  arc A9 (-64.35, 41.325) -> (-71.85, 33.825) centre (-64.35, 33.825) ccw projected
  line L9 (-64.35, 41.325) -> (61.85, 41.325) projected
  arc A10 (69.35, 33.825) -> (61.85, 41.325) centre (61.85, 33.825) ccw projected
  line L10 (69.35, 33.825) -> (69.35, -31.825) projected
  arc A11 (61.85, -39.325) -> (69.35, -31.825) centre (61.85, -31.825) ccw projected
  line L11 (61.85, -39.325) -> (-64.35, -39.325) projected
  arc A12 (-65.175, 35.475) -> (-65.175, 32.175) centre (-65.175, 33.825) ccw projected
  line L12 (-65.175, 32.175) -> (-63.525, 32.175) projected
  arc A13 (-63.525, 32.175) -> (-63.525, 35.475) centre (-63.525, 33.825) ccw projected
  line L13 (-63.525, 35.475) -> (-65.175, 35.475) projected
  arc A14 (-45.25, -21.25) -> (-35.25, -31.25) centre (-35.25, -21.25) ccw projected
  line L14 (-35.25, -31.25) -> (22.75, -31.25) projected
  arc A15 (22.75, -31.25) -> (32.75, -21.25) centre (22.75, -21.25) ccw projected
  line L15 (32.75, -21.25) -> (32.75, 27.75) projected
  arc A16 (32.75, 27.75) -> (22.75, 37.75) centre (22.75, 27.75) ccw projected
  line L16 (22.75, 37.75) -> (-35.25, 37.75) projected
  arc A17 (-35.25, 37.75) -> (-45.25, 27.75) centre (-35.25, 27.75) ccw projected
  line L17 (-45.25, 27.75) -> (-45.25, -21.25) projected
  arc A18 (-65.175, -30.175) -> (-65.175, -33.475) centre (-65.175, -31.825) ccw projected
  line L18 (-65.175, -33.475) -> (-63.525, -33.475) projected
  arc A19 (-63.525, -33.475) -> (-63.525, -30.175) centre (-63.525, -31.825) ccw projected
  line L19 (-63.525, -30.175) -> (-65.175, -30.175) projected
  line L20 (62.675, -30.175) -> (61.025, -30.175) projected
  arc A20 (61.025, -30.175) -> (61.025, -33.475) centre (61.025, -31.825) ccw projected
  line L21 (61.025, -33.475) -> (62.675, -33.475) projected
  arc A21 (62.675, -33.475) -> (62.675, -30.175) centre (62.675, -31.825) ccw projected
  line L22 (62.675, 35.475) -> (61.025, 35.475) projected
  arc A22 (61.025, 35.475) -> (61.025, 32.175) centre (61.025, 33.825) ccw projected
  line L23 (61.025, 32.175) -> (62.675, 32.175) projected
  arc A23 (62.675, 32.175) -> (62.675, 35.475) centre (62.675, 33.825) ccw projected
  line L24 (24.25, -25.75) -> (-36.75, -25.75)
  line L25 (-39.75, -22.75) -> (-39.75, 29.25)
  line L26 (-36.75, 32.25) -> (24.25, 32.25)
  line L27 (27.25, 29.25) -> (27.25, -22.75)
  line L28 (27.25, -25.75) -> (-39.75, 32.25) construction
  line L29 (-39.75, -25.75) -> (27.25, 32.25) construction
  arc A24 (-36.75, 32.25) -> (-39.75, 29.25) centre (-36.75, 29.25) ccw
  arc A25 (27.25, 29.25) -> (24.25, 32.25) centre (24.25, 29.25) ccw
  arc A26 (24.25, -25.75) -> (27.25, -22.75) centre (24.25, -22.75) ccw
  arc A27 (-39.75, -22.75) -> (-36.75, -25.75) centre (-36.75, -22.75) ccw
  line L30 (22.75, -21.25) -> (-35.25, -21.25) construction
  line L31 (-35.25, -21.25) -> (-35.25, 27.75) construction
  line L32 (-35.25, 27.75) -> (22.75, 27.75) construction
  line L33 (22.75, 27.75) -> (22.75, -21.25) construction
  line L34 (22.75, -21.25) -> (-35.25, 27.75) construction
  line L35 (-35.25, -21.25) -> (22.75, 27.75) construction
  line L36 (24.25, -22.75) -> (-36.75, -22.75) construction
  line L37 (-36.75, -22.75) -> (-36.75, 29.25) construction
  line L38 (-36.75, 29.25) -> (24.25, 29.25) construction
  line L39 (24.25, 29.25) -> (24.25, -22.75) construction
  line L40 (24.25, -22.75) -> (-36.75, 29.25) construction
  line L41 (-36.75, -22.75) -> (24.25, 29.25) construction
  line L42 (-39.75, 13.25) -> (-43.25, 13.25)
  line L43 (-6.25, 3.25) -> (-45.25, 3.25) construction
  line L44 (-43.25, -6.75) -> (-39.75, -6.75)
  line L45 (-45.25, 11.25) -> (-45.25, -4.75)
  arc A28 (-43.25, 13.25) -> (-45.25, 11.25) centre (-43.25, 11.25) ccw
  arc A29 (-45.25, -4.75) -> (-43.25, -6.75) centre (-43.25, -4.75) ccw
  line L46 (-45.25, 27.75) -> (-45.25, -21.25) projected
  point P0 (0, 0)
  point P1 (-6.25, 3.25)
  point P2 (-45.25, 13.25)
  point P3 (-45.25, -6.75)
  dimension "d35" = 3
  dimension "d36" = 1.5
  dimension "d37" = 1.5
  dimension "d40" = 2
  dimension "d41" = 20
extrude "Extrusion4" add sketch "Sketch4" against normal up to surface (1 mm away) contours L17 A29 L44 L25 A27 L24 A26 L27 A25 L26 A24 L42 A28 A17 L16 A16 L15 A15 L14 A14
properties part number "Navi base plate"
